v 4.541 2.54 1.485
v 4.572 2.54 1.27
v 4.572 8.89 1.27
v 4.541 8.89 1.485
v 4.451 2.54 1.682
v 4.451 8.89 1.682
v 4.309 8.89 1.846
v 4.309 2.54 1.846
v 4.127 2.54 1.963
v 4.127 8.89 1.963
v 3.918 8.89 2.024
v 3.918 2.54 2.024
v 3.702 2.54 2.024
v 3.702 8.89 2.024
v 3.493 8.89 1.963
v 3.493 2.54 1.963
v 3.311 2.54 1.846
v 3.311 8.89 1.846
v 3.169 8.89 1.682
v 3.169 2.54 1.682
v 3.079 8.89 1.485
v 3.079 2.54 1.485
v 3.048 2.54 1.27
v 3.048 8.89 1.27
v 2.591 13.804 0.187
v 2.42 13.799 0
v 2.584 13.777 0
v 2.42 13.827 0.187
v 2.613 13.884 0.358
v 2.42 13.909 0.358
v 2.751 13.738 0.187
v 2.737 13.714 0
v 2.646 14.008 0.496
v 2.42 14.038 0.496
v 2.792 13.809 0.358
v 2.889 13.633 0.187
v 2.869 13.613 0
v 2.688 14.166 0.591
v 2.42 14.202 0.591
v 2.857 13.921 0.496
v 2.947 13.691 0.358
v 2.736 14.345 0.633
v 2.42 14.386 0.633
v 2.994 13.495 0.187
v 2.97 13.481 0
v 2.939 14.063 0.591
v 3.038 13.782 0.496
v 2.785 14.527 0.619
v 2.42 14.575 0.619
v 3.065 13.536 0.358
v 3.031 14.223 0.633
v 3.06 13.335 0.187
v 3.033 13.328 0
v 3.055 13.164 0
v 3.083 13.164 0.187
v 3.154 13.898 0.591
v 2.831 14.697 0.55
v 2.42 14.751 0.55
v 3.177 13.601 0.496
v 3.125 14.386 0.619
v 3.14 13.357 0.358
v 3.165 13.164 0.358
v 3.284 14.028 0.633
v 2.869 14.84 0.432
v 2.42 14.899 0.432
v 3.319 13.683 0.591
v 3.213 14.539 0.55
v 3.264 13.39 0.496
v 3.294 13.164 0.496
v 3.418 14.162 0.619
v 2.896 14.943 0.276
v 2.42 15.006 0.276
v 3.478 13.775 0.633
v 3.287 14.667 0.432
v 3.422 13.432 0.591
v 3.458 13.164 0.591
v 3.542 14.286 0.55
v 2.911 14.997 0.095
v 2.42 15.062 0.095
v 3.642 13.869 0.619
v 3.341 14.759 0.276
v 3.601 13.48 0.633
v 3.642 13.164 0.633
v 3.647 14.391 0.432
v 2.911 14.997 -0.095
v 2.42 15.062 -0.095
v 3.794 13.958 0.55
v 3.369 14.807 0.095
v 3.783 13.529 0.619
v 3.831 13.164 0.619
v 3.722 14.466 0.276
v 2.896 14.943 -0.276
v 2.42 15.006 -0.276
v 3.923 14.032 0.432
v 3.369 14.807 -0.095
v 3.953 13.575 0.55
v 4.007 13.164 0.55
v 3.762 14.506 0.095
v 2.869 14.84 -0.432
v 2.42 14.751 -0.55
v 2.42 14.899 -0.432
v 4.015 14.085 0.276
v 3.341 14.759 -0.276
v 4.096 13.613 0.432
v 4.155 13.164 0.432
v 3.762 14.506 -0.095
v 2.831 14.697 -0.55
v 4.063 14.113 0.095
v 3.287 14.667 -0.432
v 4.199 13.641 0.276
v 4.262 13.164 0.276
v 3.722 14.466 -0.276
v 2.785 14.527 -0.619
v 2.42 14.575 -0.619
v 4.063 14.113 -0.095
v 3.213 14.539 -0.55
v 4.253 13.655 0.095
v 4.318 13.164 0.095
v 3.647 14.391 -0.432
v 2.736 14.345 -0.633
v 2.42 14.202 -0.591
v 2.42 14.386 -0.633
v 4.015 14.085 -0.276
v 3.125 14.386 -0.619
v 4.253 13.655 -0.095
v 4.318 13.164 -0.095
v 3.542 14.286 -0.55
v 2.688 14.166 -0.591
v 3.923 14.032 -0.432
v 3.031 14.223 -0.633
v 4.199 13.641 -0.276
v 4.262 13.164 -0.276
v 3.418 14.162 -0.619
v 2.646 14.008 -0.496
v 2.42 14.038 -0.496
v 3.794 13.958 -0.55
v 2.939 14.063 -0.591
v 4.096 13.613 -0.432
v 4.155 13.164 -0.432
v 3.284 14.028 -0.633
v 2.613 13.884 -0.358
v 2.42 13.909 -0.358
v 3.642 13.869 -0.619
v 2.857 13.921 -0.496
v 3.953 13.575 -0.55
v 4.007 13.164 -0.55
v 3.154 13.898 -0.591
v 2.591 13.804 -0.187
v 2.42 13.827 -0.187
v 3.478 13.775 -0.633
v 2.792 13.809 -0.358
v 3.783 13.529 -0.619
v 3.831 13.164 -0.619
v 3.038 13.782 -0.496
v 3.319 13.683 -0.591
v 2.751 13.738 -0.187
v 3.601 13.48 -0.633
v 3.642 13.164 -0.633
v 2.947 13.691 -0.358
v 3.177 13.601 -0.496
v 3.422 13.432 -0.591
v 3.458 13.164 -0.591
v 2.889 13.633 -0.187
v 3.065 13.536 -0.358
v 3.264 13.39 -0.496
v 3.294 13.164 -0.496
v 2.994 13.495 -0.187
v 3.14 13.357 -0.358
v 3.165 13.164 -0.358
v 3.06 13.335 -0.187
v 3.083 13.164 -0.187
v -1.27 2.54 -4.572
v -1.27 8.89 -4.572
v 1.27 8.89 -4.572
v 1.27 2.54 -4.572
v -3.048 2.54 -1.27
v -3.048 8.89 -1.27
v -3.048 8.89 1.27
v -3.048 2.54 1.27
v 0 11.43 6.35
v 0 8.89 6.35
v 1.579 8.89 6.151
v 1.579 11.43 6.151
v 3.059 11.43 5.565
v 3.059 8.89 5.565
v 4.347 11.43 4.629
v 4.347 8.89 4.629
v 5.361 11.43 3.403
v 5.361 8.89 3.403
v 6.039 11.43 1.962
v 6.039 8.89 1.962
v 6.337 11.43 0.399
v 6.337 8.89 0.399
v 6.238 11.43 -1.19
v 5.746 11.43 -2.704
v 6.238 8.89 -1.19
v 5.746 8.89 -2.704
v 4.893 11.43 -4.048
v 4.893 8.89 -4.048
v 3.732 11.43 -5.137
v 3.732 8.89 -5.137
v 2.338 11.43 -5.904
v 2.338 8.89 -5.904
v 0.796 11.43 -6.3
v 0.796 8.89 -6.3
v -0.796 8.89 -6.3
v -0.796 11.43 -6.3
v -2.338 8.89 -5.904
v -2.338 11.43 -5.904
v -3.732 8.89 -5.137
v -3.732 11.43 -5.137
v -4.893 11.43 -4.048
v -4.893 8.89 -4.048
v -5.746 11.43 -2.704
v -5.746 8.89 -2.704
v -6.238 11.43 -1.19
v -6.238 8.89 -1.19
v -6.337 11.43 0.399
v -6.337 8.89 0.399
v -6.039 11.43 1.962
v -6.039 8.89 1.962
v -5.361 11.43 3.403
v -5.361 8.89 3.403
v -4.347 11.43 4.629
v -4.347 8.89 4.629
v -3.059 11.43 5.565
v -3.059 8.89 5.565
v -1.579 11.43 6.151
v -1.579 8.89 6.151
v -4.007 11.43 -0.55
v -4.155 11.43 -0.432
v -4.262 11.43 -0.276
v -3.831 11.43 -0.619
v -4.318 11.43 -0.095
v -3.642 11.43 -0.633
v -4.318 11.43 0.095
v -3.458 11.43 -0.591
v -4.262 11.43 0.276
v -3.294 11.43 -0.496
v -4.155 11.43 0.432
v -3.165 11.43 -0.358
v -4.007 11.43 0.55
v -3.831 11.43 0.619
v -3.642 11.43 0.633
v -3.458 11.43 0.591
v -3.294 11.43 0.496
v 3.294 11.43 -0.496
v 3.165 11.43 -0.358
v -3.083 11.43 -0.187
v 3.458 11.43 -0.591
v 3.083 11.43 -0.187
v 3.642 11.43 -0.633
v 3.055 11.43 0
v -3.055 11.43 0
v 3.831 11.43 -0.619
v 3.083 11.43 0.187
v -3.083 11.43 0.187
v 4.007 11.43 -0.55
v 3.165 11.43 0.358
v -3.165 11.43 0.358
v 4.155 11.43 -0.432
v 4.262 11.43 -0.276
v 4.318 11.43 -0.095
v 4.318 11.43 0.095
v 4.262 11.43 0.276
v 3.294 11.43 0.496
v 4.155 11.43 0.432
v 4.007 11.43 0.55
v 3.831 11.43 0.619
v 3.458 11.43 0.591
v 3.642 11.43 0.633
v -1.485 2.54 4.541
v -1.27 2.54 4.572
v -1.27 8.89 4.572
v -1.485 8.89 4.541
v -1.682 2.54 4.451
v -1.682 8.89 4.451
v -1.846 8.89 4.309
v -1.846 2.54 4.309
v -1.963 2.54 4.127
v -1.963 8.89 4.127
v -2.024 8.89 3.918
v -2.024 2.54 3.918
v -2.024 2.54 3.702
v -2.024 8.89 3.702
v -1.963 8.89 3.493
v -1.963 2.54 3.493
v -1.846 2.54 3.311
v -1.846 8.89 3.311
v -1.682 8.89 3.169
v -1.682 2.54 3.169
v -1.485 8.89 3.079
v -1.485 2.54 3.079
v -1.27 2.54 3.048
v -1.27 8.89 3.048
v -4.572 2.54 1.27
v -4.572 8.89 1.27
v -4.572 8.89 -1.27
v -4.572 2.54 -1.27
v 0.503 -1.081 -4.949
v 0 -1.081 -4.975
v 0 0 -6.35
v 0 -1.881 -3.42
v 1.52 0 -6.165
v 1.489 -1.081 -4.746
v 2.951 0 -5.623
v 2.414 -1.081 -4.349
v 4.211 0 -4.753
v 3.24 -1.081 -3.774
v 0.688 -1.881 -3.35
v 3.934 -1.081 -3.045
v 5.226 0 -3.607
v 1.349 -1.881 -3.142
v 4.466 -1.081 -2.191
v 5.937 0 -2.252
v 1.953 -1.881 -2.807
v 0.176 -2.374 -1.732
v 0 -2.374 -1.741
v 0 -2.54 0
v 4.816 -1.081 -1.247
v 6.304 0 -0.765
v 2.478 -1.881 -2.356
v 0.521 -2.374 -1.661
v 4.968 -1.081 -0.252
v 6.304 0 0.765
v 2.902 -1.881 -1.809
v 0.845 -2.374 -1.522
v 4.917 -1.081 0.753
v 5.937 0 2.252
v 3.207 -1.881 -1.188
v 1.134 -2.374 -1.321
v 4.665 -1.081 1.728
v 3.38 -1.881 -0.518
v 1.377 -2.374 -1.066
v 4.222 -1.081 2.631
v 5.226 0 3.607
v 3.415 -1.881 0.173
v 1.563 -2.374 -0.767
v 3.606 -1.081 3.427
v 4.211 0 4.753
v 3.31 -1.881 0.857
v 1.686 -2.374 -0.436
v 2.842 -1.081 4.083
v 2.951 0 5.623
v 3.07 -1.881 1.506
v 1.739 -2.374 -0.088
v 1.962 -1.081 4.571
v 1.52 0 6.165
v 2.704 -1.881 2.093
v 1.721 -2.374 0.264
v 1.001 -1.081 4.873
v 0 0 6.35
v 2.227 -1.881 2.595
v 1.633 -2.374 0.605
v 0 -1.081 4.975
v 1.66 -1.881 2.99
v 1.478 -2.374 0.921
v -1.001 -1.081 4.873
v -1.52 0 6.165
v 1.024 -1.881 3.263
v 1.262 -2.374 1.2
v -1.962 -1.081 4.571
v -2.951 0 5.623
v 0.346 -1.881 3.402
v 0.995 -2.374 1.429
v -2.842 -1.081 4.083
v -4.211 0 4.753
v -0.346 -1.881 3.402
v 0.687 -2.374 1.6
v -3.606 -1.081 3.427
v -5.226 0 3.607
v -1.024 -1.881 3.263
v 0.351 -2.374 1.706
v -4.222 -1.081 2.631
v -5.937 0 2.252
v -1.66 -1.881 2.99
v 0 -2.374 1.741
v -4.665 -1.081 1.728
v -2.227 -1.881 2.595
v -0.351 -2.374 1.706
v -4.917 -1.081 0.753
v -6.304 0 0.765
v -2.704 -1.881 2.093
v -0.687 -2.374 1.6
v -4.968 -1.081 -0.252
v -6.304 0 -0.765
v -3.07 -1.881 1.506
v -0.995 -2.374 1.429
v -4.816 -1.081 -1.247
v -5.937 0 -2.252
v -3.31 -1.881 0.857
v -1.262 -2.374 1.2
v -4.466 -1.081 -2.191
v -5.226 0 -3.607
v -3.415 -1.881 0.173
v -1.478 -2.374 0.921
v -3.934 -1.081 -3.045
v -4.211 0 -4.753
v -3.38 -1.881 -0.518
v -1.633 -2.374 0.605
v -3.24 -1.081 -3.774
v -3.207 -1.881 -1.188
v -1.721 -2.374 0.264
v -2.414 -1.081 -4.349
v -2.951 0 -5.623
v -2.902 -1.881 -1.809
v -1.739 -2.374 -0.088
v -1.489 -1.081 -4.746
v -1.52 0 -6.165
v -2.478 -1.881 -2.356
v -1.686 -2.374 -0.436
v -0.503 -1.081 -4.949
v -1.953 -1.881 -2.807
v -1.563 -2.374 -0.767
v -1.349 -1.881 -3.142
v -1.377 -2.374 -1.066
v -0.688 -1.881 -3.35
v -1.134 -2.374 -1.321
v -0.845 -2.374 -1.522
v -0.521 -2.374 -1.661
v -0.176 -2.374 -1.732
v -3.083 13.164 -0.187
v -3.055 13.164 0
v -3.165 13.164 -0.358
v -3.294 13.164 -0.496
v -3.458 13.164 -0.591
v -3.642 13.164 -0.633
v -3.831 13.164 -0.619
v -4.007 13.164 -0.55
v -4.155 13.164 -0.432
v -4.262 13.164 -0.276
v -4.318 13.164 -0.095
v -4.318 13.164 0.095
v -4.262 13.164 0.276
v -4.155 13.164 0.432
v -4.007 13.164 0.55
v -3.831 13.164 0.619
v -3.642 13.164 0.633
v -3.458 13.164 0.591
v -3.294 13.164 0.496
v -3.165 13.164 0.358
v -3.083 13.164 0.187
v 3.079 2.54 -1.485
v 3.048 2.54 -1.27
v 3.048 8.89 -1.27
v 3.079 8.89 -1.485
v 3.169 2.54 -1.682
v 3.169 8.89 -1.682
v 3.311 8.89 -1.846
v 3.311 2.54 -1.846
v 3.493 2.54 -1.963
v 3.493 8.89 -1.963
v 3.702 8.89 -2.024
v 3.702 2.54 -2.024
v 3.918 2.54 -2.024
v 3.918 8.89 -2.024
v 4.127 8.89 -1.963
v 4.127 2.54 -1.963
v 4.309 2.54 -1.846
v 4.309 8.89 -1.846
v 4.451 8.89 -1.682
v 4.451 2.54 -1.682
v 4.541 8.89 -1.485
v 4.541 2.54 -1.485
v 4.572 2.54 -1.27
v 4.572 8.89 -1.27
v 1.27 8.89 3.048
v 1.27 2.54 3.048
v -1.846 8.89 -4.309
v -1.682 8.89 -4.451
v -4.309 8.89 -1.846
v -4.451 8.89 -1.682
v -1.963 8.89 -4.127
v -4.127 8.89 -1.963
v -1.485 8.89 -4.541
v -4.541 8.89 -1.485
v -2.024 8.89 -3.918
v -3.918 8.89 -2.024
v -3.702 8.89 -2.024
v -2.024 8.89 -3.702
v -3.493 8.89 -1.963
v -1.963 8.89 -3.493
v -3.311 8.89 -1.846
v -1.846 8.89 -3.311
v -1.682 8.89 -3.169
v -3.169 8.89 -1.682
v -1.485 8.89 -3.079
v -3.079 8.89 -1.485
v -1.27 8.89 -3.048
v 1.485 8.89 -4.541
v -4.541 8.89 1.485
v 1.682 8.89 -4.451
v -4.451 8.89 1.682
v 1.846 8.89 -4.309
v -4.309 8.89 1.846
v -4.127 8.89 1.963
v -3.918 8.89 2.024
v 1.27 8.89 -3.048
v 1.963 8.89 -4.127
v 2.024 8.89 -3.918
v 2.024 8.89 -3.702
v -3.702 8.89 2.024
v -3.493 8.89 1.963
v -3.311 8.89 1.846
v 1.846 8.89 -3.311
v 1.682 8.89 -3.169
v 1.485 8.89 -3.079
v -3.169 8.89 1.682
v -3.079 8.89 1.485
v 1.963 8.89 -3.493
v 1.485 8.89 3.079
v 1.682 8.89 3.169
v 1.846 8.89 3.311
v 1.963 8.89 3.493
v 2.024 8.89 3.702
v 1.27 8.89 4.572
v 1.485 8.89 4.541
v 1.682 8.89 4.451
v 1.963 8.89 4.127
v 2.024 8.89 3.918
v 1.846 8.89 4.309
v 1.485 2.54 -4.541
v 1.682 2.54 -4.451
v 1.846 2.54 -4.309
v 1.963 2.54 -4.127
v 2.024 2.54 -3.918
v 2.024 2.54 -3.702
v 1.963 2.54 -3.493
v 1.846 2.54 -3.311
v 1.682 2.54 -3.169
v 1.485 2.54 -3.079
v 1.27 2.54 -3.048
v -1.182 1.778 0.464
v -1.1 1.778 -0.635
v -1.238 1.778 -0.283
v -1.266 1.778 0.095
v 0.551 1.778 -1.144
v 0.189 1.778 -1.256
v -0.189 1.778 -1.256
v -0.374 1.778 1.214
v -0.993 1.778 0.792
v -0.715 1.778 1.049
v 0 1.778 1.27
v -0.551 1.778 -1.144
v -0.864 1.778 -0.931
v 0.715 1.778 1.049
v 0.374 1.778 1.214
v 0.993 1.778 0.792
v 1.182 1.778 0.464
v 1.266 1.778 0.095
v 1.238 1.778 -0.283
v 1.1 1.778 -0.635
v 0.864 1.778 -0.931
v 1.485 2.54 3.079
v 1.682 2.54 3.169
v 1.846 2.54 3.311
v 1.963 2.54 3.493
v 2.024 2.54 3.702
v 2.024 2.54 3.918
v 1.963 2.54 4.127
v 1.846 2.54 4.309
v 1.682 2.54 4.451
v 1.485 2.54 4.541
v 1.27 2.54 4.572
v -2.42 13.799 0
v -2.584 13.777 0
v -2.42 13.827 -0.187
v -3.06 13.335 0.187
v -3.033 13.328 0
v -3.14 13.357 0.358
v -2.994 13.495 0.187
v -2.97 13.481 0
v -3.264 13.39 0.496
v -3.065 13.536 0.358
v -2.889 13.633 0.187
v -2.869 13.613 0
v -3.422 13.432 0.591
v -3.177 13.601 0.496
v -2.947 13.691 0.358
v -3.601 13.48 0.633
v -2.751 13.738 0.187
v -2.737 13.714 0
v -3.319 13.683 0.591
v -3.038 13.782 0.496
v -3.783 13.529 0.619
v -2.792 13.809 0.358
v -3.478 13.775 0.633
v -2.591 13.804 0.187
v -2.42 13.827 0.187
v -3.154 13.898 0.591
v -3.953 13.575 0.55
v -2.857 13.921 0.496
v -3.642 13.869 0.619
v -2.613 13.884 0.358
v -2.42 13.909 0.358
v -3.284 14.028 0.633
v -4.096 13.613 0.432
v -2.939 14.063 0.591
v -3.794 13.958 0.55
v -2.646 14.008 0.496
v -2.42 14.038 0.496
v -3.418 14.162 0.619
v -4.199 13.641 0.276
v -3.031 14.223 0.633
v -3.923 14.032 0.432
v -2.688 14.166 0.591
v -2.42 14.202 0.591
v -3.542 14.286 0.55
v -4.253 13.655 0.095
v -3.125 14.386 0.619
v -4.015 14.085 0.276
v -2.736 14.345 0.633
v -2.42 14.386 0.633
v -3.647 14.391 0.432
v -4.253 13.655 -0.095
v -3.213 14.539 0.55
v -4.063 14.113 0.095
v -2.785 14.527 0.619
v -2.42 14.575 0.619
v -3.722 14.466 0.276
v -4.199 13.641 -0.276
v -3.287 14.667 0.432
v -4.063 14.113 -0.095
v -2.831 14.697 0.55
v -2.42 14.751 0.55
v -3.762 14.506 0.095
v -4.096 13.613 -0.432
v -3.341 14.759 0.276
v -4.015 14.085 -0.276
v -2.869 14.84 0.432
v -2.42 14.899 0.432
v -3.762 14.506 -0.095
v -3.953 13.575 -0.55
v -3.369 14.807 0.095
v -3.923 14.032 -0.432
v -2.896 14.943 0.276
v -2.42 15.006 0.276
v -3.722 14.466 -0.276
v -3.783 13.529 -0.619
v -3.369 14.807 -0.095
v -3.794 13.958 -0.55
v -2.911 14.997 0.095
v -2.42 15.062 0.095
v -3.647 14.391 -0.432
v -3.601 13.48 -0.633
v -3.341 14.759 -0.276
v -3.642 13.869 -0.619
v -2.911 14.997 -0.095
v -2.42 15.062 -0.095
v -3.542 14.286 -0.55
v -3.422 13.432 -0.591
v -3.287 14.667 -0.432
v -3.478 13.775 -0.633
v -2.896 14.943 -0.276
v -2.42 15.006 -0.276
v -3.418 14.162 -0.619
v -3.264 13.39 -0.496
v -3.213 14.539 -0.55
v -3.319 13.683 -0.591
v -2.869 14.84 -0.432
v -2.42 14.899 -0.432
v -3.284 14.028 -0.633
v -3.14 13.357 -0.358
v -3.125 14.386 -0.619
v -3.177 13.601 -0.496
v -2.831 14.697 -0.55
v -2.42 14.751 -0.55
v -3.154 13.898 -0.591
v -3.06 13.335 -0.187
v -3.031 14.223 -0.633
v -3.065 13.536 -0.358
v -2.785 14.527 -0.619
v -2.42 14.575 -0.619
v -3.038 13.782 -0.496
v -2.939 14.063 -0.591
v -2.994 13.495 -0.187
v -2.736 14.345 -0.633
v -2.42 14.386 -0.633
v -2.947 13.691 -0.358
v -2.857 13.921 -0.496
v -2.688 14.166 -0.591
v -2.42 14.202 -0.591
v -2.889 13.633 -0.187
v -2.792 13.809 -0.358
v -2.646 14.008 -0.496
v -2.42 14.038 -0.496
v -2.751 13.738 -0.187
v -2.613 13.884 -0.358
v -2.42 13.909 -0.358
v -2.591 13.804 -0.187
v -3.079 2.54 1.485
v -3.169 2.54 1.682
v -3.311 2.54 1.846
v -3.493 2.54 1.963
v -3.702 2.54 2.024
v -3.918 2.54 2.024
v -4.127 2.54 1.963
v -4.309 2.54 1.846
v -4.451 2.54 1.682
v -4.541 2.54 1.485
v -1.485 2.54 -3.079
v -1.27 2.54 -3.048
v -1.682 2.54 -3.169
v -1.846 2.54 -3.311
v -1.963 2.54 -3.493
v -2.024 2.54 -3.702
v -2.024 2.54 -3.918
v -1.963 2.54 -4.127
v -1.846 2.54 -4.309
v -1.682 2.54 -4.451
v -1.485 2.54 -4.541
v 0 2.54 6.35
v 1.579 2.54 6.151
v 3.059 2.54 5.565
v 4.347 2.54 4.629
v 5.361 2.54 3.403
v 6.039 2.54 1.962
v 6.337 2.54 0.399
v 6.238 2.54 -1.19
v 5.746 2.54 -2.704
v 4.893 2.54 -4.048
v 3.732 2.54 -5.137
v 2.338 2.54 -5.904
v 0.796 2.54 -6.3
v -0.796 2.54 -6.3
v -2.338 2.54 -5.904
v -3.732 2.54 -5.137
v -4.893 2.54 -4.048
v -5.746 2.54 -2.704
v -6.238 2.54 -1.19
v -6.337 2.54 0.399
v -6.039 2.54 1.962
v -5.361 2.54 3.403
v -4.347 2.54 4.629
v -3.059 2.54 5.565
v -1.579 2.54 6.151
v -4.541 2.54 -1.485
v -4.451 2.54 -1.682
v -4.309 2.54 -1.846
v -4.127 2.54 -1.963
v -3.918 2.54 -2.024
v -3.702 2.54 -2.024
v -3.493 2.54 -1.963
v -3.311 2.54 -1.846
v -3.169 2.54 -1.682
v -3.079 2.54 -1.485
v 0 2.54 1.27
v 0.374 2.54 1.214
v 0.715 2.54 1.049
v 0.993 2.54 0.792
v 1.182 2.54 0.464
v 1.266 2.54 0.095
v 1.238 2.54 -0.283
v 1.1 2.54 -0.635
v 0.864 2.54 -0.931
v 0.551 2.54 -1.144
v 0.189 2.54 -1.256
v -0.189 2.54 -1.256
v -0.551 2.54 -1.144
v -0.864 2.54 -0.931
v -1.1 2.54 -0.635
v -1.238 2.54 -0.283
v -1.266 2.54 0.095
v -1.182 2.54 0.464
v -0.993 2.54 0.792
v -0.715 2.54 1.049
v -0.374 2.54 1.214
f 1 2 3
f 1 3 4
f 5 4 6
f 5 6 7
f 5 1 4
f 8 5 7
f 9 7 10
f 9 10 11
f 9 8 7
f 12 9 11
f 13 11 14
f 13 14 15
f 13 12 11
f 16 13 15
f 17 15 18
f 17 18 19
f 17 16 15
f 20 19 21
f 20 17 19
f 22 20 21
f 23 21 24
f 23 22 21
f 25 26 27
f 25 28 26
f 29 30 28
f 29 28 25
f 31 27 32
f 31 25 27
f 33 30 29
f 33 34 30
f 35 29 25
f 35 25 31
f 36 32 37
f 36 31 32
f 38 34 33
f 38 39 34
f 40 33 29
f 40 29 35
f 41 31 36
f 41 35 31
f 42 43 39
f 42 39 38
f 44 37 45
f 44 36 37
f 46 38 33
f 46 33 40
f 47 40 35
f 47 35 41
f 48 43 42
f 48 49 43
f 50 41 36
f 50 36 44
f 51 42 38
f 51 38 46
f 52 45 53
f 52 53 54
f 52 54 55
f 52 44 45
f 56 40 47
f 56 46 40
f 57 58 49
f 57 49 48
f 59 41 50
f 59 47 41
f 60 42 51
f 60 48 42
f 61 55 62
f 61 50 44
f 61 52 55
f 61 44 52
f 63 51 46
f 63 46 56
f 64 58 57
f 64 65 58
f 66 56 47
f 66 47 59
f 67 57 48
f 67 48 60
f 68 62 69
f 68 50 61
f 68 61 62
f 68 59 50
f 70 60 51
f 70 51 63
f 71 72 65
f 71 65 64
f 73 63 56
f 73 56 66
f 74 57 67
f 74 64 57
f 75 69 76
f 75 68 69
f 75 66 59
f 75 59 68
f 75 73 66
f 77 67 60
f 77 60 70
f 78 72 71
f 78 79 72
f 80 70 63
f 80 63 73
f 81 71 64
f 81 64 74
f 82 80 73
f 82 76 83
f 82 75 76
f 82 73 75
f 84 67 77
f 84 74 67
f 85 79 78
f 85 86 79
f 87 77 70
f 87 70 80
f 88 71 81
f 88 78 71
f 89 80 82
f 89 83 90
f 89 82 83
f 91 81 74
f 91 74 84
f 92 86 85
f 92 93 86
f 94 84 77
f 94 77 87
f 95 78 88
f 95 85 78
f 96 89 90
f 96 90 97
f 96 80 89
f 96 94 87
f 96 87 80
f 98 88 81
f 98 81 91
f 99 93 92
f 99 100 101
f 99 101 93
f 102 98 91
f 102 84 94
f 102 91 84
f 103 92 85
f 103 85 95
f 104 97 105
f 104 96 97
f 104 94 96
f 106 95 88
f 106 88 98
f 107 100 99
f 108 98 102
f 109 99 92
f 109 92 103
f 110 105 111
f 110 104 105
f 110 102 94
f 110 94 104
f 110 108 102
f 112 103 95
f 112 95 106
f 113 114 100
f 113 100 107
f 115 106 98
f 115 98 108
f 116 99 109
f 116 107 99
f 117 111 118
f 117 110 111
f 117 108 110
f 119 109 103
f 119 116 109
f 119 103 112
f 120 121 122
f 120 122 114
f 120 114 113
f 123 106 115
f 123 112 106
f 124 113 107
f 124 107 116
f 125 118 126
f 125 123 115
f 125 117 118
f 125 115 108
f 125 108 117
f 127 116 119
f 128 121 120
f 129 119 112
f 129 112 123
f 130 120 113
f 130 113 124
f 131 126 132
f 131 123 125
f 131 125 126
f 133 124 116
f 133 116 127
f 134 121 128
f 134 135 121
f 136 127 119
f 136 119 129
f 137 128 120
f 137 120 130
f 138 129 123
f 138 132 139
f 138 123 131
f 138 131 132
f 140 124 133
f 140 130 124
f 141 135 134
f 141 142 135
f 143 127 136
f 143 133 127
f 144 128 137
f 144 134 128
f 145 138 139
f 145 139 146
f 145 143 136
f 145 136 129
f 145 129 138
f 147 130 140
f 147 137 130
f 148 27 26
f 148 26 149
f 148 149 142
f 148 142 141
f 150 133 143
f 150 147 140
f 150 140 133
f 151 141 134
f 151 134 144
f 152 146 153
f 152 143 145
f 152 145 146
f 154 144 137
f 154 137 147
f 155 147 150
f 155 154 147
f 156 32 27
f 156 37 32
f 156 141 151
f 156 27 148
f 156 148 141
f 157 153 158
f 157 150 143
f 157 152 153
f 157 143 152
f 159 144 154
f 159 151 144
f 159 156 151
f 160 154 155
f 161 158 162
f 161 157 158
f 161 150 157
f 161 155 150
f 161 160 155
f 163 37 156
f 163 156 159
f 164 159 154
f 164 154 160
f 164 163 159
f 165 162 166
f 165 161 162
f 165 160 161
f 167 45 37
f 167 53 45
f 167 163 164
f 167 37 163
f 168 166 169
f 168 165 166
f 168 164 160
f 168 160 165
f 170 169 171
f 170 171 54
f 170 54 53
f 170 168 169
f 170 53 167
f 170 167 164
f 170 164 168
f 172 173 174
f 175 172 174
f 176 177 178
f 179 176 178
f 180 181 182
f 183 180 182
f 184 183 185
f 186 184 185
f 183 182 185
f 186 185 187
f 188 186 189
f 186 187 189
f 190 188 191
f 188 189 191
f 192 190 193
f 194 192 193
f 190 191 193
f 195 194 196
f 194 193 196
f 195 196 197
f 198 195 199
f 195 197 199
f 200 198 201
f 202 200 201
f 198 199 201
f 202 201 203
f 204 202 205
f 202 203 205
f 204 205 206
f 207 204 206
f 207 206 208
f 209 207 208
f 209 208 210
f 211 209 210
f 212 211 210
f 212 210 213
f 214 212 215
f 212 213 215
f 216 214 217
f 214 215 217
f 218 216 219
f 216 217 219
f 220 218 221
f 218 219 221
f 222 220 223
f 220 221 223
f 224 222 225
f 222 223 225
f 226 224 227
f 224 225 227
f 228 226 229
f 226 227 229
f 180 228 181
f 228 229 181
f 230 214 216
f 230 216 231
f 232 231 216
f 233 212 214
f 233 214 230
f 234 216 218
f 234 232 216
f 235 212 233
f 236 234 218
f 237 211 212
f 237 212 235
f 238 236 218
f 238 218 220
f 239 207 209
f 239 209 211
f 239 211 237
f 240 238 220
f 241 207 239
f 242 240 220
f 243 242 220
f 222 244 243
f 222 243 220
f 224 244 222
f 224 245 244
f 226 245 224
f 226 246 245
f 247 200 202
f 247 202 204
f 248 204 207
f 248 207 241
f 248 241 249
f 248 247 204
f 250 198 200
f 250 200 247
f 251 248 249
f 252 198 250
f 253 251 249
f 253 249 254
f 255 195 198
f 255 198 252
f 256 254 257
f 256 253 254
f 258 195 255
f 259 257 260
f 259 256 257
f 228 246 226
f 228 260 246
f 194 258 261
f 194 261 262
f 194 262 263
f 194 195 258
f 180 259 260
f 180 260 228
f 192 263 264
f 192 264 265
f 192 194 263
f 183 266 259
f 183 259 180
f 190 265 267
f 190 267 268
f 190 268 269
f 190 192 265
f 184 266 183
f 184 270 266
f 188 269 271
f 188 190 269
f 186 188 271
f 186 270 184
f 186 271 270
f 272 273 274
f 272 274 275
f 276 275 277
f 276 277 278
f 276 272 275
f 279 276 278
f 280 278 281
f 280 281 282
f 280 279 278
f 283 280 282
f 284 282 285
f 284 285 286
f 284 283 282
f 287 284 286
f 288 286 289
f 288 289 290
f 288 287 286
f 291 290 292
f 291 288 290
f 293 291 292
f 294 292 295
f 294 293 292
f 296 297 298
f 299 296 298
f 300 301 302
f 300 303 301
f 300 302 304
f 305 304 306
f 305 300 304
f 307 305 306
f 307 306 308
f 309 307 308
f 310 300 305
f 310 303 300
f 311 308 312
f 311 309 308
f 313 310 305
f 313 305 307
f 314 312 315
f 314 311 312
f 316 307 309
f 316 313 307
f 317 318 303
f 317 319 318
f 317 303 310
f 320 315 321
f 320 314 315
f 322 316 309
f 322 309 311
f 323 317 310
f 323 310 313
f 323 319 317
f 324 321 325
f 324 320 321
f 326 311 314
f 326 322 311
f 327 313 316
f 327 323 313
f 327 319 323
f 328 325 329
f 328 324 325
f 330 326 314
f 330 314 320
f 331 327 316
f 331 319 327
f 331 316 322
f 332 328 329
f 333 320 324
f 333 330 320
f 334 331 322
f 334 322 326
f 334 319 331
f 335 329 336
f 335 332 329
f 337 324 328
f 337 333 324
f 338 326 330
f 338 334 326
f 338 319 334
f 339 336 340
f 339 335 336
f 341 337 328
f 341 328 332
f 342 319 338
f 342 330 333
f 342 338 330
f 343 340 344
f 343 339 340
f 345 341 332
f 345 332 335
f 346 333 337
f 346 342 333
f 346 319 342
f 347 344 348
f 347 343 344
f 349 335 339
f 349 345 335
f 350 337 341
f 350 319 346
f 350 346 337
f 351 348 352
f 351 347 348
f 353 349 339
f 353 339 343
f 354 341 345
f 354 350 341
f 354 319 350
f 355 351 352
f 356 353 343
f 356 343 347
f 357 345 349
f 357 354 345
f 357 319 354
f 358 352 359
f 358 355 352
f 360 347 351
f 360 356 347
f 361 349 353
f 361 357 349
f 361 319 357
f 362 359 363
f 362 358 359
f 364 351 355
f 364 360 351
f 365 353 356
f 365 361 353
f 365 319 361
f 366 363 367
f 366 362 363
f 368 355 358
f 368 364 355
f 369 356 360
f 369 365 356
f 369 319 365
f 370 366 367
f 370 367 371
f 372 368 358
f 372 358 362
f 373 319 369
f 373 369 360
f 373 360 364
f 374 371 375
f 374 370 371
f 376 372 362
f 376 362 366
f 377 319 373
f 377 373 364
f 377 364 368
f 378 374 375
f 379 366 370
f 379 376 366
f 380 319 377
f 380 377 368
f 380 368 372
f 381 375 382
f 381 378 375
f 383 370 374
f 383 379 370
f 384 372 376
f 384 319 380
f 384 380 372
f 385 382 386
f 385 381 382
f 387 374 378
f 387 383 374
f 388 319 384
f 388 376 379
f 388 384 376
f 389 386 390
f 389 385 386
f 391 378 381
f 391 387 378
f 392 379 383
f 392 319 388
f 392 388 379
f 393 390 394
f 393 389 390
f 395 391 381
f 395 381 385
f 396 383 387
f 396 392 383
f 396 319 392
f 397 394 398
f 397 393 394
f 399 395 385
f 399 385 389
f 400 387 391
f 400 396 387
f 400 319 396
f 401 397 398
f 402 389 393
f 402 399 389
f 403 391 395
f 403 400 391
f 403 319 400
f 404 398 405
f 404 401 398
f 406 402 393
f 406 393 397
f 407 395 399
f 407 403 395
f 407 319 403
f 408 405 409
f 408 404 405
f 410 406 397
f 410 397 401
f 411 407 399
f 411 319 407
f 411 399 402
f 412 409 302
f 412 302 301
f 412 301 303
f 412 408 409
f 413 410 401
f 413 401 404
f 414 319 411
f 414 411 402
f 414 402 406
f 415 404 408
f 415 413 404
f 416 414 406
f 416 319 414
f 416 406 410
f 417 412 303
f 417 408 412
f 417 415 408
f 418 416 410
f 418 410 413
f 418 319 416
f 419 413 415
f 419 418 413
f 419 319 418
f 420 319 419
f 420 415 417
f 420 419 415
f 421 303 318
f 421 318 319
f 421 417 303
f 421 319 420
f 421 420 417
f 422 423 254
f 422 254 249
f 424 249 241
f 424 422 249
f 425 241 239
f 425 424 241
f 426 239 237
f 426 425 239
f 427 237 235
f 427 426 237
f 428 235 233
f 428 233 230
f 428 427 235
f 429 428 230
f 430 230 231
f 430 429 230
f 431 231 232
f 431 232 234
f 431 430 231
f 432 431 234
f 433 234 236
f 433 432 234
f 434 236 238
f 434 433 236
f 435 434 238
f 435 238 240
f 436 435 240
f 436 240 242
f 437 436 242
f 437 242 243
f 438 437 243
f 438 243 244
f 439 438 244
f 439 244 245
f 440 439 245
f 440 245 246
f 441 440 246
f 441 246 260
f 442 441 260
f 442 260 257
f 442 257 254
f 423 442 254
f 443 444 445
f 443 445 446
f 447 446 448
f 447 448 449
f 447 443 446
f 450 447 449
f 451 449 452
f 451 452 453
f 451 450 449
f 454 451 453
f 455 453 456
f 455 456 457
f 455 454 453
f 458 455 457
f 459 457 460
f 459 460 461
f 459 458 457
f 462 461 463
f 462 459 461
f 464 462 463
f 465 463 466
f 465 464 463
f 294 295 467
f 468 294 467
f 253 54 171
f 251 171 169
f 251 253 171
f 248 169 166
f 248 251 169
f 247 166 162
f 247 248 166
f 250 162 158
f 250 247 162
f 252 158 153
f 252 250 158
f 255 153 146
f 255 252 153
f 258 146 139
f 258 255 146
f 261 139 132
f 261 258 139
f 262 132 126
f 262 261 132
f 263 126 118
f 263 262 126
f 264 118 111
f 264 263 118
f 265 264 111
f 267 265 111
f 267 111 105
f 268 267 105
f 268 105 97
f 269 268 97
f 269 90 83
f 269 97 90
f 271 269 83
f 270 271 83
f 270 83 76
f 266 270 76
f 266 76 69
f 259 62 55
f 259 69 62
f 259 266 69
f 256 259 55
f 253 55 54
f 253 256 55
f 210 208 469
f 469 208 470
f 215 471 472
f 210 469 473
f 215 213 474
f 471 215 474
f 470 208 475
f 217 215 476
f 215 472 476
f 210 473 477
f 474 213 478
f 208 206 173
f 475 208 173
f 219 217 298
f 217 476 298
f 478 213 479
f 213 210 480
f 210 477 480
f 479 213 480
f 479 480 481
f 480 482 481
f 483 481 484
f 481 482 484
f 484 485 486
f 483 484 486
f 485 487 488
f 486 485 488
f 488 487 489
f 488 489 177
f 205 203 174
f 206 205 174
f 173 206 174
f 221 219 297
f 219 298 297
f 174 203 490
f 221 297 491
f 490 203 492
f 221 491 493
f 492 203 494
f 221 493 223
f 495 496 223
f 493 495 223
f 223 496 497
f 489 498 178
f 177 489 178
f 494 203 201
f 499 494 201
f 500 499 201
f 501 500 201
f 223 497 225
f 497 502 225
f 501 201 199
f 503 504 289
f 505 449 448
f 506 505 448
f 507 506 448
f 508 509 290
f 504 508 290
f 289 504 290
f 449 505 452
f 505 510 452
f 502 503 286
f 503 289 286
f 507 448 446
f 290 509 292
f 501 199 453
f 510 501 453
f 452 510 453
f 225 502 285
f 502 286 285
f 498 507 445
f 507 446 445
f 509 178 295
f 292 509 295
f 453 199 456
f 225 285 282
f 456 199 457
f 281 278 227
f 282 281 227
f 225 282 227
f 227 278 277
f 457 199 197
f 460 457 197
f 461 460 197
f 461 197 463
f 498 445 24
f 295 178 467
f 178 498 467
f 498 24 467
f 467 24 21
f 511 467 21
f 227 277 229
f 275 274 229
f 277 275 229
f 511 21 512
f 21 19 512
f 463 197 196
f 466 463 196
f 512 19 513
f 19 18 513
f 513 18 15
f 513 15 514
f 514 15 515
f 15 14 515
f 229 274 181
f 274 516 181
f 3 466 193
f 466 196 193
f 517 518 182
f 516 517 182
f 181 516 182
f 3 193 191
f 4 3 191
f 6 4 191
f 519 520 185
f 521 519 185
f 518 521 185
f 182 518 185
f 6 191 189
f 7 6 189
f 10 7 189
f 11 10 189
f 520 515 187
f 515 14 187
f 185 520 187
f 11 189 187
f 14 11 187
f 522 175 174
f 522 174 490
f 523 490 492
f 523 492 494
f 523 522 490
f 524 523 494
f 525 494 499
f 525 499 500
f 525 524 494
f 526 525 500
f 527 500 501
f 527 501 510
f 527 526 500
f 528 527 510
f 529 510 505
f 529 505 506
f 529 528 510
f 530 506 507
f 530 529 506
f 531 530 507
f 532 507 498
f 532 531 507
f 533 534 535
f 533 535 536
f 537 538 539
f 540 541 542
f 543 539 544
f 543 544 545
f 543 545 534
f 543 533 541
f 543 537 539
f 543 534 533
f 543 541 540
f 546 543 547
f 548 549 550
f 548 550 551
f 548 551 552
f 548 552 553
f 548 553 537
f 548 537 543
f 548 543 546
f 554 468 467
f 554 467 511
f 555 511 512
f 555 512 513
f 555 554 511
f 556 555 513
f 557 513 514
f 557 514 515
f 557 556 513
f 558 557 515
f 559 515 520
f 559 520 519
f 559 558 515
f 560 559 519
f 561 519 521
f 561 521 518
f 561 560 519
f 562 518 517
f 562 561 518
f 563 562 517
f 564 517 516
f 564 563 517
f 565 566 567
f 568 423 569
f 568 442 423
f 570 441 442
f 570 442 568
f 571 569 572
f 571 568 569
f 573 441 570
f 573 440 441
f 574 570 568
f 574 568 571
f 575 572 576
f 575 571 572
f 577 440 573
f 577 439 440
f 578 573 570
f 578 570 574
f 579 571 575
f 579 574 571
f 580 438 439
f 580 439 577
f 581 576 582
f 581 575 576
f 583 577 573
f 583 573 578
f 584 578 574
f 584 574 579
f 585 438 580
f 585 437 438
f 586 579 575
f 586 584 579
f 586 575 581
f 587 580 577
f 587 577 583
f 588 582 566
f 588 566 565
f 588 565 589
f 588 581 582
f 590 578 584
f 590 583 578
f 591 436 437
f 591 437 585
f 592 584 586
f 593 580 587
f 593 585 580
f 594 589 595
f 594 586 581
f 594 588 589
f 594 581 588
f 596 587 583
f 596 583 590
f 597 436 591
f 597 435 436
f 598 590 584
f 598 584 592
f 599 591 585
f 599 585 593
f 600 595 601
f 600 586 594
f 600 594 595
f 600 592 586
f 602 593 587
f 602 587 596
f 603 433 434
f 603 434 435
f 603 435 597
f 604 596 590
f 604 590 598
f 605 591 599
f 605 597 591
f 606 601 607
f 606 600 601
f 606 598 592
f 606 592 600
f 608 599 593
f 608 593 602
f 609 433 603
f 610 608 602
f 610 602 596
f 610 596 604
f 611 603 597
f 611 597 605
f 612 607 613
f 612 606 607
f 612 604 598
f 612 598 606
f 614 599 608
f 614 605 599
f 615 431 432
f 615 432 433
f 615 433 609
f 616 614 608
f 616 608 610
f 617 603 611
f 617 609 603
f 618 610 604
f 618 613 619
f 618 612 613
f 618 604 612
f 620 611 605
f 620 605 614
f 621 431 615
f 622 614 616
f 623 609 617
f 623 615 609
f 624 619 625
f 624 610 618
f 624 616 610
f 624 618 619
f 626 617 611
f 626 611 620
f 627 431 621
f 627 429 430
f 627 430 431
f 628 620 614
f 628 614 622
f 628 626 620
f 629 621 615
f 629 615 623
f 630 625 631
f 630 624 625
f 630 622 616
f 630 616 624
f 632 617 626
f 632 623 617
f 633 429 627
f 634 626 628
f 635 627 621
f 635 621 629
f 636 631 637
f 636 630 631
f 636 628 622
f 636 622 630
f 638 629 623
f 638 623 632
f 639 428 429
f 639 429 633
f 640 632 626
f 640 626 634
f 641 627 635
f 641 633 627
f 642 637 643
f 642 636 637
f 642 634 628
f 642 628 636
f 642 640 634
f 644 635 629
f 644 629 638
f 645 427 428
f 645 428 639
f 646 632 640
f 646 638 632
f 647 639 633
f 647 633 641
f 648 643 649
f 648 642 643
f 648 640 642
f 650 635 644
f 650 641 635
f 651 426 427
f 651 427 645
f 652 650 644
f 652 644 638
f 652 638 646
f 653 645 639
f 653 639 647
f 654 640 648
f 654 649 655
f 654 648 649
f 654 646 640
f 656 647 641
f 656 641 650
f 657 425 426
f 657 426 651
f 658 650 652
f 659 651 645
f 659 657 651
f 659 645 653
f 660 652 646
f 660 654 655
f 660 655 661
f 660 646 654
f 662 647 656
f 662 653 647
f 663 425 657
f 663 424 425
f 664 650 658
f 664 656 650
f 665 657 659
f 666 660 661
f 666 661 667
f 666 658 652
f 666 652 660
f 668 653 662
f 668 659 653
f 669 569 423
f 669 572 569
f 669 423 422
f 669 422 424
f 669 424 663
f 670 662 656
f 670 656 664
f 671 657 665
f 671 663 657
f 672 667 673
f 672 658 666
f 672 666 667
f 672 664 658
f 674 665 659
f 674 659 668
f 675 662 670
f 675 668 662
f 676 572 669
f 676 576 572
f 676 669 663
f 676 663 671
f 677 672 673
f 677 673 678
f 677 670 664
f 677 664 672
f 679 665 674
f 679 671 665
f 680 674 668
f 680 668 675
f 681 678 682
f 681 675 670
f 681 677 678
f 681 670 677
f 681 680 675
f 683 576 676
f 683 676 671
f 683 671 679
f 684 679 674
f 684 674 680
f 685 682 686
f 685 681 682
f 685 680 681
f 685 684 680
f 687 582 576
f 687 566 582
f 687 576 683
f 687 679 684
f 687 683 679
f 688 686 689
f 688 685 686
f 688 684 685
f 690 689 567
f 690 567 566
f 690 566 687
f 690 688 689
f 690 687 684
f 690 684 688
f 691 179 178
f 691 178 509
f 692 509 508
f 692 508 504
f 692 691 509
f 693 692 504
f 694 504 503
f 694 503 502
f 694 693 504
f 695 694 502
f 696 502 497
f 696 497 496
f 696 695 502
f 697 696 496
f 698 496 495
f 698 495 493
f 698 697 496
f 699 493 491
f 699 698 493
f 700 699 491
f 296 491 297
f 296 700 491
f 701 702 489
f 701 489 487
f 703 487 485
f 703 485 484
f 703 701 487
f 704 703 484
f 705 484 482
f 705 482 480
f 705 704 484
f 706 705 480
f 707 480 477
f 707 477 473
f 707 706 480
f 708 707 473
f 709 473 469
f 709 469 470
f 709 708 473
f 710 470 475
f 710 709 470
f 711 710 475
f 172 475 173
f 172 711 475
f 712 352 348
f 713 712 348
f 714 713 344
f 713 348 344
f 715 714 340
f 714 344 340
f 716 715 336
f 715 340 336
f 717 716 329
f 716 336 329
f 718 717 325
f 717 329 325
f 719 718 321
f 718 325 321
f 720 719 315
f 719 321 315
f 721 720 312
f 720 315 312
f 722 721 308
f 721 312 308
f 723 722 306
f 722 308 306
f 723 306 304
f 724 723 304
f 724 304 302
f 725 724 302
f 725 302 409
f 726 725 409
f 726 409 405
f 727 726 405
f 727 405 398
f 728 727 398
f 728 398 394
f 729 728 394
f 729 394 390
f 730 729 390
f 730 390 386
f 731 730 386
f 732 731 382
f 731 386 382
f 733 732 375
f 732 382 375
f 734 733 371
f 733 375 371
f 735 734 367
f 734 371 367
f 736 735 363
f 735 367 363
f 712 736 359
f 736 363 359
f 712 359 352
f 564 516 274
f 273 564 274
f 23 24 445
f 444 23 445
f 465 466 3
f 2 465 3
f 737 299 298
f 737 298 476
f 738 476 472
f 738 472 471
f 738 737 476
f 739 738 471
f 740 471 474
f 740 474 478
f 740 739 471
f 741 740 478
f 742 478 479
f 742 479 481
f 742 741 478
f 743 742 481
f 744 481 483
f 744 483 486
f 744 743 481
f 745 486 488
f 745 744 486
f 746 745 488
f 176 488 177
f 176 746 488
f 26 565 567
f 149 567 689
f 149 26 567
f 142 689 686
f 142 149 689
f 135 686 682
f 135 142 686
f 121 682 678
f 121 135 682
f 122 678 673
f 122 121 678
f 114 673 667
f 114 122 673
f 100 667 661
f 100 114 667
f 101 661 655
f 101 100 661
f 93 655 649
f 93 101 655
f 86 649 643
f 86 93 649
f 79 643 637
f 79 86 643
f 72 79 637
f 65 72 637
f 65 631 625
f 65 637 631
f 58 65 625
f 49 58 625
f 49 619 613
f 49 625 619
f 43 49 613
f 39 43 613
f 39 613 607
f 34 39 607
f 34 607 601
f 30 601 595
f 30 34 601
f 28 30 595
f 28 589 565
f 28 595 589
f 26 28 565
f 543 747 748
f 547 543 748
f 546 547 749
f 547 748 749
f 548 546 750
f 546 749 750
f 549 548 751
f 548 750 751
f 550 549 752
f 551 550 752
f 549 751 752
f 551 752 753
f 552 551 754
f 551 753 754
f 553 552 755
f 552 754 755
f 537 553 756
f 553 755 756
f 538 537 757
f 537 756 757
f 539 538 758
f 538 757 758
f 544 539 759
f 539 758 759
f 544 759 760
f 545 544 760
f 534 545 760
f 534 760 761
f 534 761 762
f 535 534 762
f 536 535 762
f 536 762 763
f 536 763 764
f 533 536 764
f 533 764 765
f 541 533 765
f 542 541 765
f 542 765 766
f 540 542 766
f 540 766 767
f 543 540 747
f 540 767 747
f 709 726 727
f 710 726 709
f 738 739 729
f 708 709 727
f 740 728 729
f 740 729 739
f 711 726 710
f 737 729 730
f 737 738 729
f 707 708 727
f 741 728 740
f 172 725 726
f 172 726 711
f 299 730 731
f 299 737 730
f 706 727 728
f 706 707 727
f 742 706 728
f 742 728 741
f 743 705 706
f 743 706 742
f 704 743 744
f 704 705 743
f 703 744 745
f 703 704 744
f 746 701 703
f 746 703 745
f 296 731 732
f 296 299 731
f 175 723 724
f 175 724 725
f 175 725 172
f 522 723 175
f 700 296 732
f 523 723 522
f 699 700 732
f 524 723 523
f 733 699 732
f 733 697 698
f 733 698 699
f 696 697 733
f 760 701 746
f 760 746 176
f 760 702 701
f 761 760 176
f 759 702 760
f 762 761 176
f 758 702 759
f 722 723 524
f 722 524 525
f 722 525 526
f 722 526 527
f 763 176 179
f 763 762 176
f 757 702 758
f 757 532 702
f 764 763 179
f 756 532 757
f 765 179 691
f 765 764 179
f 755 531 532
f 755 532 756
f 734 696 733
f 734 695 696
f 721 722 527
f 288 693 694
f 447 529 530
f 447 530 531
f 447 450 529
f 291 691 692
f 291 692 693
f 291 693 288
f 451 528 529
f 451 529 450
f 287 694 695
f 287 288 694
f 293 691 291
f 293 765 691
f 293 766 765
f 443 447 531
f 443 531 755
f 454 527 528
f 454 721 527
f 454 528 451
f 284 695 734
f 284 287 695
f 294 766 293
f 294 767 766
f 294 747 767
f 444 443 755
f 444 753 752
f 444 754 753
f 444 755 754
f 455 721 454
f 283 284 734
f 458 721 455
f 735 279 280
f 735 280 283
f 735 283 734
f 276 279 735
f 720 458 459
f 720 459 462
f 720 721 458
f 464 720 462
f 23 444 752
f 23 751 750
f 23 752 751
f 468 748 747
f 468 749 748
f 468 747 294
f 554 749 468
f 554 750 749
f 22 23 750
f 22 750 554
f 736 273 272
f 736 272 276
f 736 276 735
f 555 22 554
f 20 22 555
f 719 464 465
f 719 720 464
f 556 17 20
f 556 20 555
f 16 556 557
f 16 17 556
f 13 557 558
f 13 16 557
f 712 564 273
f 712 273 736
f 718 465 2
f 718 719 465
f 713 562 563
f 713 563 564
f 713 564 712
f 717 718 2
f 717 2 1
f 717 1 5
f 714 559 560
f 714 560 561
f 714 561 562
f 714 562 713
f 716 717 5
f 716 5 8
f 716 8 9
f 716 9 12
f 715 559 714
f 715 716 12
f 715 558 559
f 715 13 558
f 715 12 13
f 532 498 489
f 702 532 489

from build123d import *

# Parameters (mm, degrees)
SKETCH1_R               = 6.35
BUTTON_DEPTH            = 2.54
ONE_LEG_DEPTH           = 6.35
MOAR_LEGS_COUNT         = 4
SKETCH3_R               = 6.35
BUTTON_BOTTOM_DEPTH     = 2.54
BUTTON_TOP_FACE_RADIUS  = 6.35
BUTTON_TOP_HEIGHT       = 2.54
SKETCH5_R               = 0.635
SKETCH6_R               = 1.27
RECESS_FOR_SPRING_DEPTH = 0.762


with BuildPart() as part:
    # Sketch1 → button (new body)
    with BuildSketch(Plane(origin=(0, 0, 0), x_dir=(1, 0, 0), z_dir=(0, 1, 0))):
        with Locations(Location((0, 0, 0), (0, 0, 270))):
            Circle(SKETCH1_R)
    extrude(amount=BUTTON_DEPTH)

    # Sketch2 → one leg (add)
    with BuildSketch(Plane(origin=(0, 2.54, 0), x_dir=(1, 0, 0), z_dir=(0, 1, 0))):
        with BuildLine():
            Line((-1.27, -3.048), (1.27, -3.048))
            ThreePointArc((1.27, -3.048), (2.032, -3.81), (1.27, -4.572))
            Line((1.27, -4.572), (-1.27, -4.572))
            ThreePointArc((-1.27, -4.572), (-2.032, -3.81), (-1.27, -3.048))
        make_face()
    one_leg = extrude(amount=ONE_LEG_DEPTH)

    # moar legs: one leg ×4 about axis
    moar_legs_axis = Axis((0, 0, 0), (0, 1, 0))
    for i in range(1, MOAR_LEGS_COUNT):
        add(one_leg.rotate(moar_legs_axis, i * 360 / MOAR_LEGS_COUNT))

    # Sketch3 → button bottom (add)
    with BuildSketch(Plane(origin=(0, 8.89, 0), x_dir=(1, 0, 0), z_dir=(0, 1, 0))):
        with Locations(Location((0, 0, 0), (0, 0, 270))):
            Circle(SKETCH3_R)
    extrude(amount=BUTTON_BOTTOM_DEPTH)

    # button top: a dome of height H over a round flat face of radius A is a cap of a sphere of radius (A * A + H * H) / (2 * H)
    button_top_r = (BUTTON_TOP_FACE_RADIUS * BUTTON_TOP_FACE_RADIUS + BUTTON_TOP_HEIGHT * BUTTON_TOP_HEIGHT) / (2 * BUTTON_TOP_HEIGHT)
    button_top_base = Plane((0, 0, 0), z_dir=(0, -1, 0))
    with Locations(button_top_base.offset(BUTTON_TOP_HEIGHT - button_top_r)):
        button_top_ball = Sphere(button_top_r, mode=Mode.PRIVATE)
    add(split(button_top_ball, bisect_by=button_top_base, keep=Keep.TOP, mode=Mode.PRIVATE))

    # handle for linkage: sweep along a path in Sketch4
    with BuildLine(Plane.XY) as handle_for_linkage_path:
        Line((-3.689676867, 11.43), (-3.689676867, 13.163817949))
        ThreePointArc((-3.689676867, 13.163817949), (-3.317702479, 14.061843561), (-2.419676867, 14.433817949))
        Line((-2.419676867, 14.433817949), (2.419676867, 14.433817949))
        ThreePointArc((2.419676867, 14.433817949), (3.317702479, 14.061843561), (3.689676867, 13.163817949))
        Line((3.689676867, 13.163817949), (3.689676867, 11.43))
    # Sketch5 → handle for linkage (sweep)
    with BuildSketch(Plane(origin=(0, 11.43, 0), x_dir=(1, 0, 0), z_dir=(0, 1, 0))):
        with Locations((-3.689676867, 0)):
            Circle(SKETCH5_R)
    sweep(path=handle_for_linkage_path.line)

    # Sketch6 → recess for spring (cut)
    with BuildSketch(Plane(origin=(0, 2.54, 0), x_dir=(1, 0, 0), z_dir=(0, 1, 0))):
        with Locations(Location((0, 0, 0), (0, 0, 270))):
            Circle(SKETCH6_R)
    extrude(amount=-RECESS_FOR_SPRING_DEPTH, mode=Mode.SUBTRACT)


solid = part.part
